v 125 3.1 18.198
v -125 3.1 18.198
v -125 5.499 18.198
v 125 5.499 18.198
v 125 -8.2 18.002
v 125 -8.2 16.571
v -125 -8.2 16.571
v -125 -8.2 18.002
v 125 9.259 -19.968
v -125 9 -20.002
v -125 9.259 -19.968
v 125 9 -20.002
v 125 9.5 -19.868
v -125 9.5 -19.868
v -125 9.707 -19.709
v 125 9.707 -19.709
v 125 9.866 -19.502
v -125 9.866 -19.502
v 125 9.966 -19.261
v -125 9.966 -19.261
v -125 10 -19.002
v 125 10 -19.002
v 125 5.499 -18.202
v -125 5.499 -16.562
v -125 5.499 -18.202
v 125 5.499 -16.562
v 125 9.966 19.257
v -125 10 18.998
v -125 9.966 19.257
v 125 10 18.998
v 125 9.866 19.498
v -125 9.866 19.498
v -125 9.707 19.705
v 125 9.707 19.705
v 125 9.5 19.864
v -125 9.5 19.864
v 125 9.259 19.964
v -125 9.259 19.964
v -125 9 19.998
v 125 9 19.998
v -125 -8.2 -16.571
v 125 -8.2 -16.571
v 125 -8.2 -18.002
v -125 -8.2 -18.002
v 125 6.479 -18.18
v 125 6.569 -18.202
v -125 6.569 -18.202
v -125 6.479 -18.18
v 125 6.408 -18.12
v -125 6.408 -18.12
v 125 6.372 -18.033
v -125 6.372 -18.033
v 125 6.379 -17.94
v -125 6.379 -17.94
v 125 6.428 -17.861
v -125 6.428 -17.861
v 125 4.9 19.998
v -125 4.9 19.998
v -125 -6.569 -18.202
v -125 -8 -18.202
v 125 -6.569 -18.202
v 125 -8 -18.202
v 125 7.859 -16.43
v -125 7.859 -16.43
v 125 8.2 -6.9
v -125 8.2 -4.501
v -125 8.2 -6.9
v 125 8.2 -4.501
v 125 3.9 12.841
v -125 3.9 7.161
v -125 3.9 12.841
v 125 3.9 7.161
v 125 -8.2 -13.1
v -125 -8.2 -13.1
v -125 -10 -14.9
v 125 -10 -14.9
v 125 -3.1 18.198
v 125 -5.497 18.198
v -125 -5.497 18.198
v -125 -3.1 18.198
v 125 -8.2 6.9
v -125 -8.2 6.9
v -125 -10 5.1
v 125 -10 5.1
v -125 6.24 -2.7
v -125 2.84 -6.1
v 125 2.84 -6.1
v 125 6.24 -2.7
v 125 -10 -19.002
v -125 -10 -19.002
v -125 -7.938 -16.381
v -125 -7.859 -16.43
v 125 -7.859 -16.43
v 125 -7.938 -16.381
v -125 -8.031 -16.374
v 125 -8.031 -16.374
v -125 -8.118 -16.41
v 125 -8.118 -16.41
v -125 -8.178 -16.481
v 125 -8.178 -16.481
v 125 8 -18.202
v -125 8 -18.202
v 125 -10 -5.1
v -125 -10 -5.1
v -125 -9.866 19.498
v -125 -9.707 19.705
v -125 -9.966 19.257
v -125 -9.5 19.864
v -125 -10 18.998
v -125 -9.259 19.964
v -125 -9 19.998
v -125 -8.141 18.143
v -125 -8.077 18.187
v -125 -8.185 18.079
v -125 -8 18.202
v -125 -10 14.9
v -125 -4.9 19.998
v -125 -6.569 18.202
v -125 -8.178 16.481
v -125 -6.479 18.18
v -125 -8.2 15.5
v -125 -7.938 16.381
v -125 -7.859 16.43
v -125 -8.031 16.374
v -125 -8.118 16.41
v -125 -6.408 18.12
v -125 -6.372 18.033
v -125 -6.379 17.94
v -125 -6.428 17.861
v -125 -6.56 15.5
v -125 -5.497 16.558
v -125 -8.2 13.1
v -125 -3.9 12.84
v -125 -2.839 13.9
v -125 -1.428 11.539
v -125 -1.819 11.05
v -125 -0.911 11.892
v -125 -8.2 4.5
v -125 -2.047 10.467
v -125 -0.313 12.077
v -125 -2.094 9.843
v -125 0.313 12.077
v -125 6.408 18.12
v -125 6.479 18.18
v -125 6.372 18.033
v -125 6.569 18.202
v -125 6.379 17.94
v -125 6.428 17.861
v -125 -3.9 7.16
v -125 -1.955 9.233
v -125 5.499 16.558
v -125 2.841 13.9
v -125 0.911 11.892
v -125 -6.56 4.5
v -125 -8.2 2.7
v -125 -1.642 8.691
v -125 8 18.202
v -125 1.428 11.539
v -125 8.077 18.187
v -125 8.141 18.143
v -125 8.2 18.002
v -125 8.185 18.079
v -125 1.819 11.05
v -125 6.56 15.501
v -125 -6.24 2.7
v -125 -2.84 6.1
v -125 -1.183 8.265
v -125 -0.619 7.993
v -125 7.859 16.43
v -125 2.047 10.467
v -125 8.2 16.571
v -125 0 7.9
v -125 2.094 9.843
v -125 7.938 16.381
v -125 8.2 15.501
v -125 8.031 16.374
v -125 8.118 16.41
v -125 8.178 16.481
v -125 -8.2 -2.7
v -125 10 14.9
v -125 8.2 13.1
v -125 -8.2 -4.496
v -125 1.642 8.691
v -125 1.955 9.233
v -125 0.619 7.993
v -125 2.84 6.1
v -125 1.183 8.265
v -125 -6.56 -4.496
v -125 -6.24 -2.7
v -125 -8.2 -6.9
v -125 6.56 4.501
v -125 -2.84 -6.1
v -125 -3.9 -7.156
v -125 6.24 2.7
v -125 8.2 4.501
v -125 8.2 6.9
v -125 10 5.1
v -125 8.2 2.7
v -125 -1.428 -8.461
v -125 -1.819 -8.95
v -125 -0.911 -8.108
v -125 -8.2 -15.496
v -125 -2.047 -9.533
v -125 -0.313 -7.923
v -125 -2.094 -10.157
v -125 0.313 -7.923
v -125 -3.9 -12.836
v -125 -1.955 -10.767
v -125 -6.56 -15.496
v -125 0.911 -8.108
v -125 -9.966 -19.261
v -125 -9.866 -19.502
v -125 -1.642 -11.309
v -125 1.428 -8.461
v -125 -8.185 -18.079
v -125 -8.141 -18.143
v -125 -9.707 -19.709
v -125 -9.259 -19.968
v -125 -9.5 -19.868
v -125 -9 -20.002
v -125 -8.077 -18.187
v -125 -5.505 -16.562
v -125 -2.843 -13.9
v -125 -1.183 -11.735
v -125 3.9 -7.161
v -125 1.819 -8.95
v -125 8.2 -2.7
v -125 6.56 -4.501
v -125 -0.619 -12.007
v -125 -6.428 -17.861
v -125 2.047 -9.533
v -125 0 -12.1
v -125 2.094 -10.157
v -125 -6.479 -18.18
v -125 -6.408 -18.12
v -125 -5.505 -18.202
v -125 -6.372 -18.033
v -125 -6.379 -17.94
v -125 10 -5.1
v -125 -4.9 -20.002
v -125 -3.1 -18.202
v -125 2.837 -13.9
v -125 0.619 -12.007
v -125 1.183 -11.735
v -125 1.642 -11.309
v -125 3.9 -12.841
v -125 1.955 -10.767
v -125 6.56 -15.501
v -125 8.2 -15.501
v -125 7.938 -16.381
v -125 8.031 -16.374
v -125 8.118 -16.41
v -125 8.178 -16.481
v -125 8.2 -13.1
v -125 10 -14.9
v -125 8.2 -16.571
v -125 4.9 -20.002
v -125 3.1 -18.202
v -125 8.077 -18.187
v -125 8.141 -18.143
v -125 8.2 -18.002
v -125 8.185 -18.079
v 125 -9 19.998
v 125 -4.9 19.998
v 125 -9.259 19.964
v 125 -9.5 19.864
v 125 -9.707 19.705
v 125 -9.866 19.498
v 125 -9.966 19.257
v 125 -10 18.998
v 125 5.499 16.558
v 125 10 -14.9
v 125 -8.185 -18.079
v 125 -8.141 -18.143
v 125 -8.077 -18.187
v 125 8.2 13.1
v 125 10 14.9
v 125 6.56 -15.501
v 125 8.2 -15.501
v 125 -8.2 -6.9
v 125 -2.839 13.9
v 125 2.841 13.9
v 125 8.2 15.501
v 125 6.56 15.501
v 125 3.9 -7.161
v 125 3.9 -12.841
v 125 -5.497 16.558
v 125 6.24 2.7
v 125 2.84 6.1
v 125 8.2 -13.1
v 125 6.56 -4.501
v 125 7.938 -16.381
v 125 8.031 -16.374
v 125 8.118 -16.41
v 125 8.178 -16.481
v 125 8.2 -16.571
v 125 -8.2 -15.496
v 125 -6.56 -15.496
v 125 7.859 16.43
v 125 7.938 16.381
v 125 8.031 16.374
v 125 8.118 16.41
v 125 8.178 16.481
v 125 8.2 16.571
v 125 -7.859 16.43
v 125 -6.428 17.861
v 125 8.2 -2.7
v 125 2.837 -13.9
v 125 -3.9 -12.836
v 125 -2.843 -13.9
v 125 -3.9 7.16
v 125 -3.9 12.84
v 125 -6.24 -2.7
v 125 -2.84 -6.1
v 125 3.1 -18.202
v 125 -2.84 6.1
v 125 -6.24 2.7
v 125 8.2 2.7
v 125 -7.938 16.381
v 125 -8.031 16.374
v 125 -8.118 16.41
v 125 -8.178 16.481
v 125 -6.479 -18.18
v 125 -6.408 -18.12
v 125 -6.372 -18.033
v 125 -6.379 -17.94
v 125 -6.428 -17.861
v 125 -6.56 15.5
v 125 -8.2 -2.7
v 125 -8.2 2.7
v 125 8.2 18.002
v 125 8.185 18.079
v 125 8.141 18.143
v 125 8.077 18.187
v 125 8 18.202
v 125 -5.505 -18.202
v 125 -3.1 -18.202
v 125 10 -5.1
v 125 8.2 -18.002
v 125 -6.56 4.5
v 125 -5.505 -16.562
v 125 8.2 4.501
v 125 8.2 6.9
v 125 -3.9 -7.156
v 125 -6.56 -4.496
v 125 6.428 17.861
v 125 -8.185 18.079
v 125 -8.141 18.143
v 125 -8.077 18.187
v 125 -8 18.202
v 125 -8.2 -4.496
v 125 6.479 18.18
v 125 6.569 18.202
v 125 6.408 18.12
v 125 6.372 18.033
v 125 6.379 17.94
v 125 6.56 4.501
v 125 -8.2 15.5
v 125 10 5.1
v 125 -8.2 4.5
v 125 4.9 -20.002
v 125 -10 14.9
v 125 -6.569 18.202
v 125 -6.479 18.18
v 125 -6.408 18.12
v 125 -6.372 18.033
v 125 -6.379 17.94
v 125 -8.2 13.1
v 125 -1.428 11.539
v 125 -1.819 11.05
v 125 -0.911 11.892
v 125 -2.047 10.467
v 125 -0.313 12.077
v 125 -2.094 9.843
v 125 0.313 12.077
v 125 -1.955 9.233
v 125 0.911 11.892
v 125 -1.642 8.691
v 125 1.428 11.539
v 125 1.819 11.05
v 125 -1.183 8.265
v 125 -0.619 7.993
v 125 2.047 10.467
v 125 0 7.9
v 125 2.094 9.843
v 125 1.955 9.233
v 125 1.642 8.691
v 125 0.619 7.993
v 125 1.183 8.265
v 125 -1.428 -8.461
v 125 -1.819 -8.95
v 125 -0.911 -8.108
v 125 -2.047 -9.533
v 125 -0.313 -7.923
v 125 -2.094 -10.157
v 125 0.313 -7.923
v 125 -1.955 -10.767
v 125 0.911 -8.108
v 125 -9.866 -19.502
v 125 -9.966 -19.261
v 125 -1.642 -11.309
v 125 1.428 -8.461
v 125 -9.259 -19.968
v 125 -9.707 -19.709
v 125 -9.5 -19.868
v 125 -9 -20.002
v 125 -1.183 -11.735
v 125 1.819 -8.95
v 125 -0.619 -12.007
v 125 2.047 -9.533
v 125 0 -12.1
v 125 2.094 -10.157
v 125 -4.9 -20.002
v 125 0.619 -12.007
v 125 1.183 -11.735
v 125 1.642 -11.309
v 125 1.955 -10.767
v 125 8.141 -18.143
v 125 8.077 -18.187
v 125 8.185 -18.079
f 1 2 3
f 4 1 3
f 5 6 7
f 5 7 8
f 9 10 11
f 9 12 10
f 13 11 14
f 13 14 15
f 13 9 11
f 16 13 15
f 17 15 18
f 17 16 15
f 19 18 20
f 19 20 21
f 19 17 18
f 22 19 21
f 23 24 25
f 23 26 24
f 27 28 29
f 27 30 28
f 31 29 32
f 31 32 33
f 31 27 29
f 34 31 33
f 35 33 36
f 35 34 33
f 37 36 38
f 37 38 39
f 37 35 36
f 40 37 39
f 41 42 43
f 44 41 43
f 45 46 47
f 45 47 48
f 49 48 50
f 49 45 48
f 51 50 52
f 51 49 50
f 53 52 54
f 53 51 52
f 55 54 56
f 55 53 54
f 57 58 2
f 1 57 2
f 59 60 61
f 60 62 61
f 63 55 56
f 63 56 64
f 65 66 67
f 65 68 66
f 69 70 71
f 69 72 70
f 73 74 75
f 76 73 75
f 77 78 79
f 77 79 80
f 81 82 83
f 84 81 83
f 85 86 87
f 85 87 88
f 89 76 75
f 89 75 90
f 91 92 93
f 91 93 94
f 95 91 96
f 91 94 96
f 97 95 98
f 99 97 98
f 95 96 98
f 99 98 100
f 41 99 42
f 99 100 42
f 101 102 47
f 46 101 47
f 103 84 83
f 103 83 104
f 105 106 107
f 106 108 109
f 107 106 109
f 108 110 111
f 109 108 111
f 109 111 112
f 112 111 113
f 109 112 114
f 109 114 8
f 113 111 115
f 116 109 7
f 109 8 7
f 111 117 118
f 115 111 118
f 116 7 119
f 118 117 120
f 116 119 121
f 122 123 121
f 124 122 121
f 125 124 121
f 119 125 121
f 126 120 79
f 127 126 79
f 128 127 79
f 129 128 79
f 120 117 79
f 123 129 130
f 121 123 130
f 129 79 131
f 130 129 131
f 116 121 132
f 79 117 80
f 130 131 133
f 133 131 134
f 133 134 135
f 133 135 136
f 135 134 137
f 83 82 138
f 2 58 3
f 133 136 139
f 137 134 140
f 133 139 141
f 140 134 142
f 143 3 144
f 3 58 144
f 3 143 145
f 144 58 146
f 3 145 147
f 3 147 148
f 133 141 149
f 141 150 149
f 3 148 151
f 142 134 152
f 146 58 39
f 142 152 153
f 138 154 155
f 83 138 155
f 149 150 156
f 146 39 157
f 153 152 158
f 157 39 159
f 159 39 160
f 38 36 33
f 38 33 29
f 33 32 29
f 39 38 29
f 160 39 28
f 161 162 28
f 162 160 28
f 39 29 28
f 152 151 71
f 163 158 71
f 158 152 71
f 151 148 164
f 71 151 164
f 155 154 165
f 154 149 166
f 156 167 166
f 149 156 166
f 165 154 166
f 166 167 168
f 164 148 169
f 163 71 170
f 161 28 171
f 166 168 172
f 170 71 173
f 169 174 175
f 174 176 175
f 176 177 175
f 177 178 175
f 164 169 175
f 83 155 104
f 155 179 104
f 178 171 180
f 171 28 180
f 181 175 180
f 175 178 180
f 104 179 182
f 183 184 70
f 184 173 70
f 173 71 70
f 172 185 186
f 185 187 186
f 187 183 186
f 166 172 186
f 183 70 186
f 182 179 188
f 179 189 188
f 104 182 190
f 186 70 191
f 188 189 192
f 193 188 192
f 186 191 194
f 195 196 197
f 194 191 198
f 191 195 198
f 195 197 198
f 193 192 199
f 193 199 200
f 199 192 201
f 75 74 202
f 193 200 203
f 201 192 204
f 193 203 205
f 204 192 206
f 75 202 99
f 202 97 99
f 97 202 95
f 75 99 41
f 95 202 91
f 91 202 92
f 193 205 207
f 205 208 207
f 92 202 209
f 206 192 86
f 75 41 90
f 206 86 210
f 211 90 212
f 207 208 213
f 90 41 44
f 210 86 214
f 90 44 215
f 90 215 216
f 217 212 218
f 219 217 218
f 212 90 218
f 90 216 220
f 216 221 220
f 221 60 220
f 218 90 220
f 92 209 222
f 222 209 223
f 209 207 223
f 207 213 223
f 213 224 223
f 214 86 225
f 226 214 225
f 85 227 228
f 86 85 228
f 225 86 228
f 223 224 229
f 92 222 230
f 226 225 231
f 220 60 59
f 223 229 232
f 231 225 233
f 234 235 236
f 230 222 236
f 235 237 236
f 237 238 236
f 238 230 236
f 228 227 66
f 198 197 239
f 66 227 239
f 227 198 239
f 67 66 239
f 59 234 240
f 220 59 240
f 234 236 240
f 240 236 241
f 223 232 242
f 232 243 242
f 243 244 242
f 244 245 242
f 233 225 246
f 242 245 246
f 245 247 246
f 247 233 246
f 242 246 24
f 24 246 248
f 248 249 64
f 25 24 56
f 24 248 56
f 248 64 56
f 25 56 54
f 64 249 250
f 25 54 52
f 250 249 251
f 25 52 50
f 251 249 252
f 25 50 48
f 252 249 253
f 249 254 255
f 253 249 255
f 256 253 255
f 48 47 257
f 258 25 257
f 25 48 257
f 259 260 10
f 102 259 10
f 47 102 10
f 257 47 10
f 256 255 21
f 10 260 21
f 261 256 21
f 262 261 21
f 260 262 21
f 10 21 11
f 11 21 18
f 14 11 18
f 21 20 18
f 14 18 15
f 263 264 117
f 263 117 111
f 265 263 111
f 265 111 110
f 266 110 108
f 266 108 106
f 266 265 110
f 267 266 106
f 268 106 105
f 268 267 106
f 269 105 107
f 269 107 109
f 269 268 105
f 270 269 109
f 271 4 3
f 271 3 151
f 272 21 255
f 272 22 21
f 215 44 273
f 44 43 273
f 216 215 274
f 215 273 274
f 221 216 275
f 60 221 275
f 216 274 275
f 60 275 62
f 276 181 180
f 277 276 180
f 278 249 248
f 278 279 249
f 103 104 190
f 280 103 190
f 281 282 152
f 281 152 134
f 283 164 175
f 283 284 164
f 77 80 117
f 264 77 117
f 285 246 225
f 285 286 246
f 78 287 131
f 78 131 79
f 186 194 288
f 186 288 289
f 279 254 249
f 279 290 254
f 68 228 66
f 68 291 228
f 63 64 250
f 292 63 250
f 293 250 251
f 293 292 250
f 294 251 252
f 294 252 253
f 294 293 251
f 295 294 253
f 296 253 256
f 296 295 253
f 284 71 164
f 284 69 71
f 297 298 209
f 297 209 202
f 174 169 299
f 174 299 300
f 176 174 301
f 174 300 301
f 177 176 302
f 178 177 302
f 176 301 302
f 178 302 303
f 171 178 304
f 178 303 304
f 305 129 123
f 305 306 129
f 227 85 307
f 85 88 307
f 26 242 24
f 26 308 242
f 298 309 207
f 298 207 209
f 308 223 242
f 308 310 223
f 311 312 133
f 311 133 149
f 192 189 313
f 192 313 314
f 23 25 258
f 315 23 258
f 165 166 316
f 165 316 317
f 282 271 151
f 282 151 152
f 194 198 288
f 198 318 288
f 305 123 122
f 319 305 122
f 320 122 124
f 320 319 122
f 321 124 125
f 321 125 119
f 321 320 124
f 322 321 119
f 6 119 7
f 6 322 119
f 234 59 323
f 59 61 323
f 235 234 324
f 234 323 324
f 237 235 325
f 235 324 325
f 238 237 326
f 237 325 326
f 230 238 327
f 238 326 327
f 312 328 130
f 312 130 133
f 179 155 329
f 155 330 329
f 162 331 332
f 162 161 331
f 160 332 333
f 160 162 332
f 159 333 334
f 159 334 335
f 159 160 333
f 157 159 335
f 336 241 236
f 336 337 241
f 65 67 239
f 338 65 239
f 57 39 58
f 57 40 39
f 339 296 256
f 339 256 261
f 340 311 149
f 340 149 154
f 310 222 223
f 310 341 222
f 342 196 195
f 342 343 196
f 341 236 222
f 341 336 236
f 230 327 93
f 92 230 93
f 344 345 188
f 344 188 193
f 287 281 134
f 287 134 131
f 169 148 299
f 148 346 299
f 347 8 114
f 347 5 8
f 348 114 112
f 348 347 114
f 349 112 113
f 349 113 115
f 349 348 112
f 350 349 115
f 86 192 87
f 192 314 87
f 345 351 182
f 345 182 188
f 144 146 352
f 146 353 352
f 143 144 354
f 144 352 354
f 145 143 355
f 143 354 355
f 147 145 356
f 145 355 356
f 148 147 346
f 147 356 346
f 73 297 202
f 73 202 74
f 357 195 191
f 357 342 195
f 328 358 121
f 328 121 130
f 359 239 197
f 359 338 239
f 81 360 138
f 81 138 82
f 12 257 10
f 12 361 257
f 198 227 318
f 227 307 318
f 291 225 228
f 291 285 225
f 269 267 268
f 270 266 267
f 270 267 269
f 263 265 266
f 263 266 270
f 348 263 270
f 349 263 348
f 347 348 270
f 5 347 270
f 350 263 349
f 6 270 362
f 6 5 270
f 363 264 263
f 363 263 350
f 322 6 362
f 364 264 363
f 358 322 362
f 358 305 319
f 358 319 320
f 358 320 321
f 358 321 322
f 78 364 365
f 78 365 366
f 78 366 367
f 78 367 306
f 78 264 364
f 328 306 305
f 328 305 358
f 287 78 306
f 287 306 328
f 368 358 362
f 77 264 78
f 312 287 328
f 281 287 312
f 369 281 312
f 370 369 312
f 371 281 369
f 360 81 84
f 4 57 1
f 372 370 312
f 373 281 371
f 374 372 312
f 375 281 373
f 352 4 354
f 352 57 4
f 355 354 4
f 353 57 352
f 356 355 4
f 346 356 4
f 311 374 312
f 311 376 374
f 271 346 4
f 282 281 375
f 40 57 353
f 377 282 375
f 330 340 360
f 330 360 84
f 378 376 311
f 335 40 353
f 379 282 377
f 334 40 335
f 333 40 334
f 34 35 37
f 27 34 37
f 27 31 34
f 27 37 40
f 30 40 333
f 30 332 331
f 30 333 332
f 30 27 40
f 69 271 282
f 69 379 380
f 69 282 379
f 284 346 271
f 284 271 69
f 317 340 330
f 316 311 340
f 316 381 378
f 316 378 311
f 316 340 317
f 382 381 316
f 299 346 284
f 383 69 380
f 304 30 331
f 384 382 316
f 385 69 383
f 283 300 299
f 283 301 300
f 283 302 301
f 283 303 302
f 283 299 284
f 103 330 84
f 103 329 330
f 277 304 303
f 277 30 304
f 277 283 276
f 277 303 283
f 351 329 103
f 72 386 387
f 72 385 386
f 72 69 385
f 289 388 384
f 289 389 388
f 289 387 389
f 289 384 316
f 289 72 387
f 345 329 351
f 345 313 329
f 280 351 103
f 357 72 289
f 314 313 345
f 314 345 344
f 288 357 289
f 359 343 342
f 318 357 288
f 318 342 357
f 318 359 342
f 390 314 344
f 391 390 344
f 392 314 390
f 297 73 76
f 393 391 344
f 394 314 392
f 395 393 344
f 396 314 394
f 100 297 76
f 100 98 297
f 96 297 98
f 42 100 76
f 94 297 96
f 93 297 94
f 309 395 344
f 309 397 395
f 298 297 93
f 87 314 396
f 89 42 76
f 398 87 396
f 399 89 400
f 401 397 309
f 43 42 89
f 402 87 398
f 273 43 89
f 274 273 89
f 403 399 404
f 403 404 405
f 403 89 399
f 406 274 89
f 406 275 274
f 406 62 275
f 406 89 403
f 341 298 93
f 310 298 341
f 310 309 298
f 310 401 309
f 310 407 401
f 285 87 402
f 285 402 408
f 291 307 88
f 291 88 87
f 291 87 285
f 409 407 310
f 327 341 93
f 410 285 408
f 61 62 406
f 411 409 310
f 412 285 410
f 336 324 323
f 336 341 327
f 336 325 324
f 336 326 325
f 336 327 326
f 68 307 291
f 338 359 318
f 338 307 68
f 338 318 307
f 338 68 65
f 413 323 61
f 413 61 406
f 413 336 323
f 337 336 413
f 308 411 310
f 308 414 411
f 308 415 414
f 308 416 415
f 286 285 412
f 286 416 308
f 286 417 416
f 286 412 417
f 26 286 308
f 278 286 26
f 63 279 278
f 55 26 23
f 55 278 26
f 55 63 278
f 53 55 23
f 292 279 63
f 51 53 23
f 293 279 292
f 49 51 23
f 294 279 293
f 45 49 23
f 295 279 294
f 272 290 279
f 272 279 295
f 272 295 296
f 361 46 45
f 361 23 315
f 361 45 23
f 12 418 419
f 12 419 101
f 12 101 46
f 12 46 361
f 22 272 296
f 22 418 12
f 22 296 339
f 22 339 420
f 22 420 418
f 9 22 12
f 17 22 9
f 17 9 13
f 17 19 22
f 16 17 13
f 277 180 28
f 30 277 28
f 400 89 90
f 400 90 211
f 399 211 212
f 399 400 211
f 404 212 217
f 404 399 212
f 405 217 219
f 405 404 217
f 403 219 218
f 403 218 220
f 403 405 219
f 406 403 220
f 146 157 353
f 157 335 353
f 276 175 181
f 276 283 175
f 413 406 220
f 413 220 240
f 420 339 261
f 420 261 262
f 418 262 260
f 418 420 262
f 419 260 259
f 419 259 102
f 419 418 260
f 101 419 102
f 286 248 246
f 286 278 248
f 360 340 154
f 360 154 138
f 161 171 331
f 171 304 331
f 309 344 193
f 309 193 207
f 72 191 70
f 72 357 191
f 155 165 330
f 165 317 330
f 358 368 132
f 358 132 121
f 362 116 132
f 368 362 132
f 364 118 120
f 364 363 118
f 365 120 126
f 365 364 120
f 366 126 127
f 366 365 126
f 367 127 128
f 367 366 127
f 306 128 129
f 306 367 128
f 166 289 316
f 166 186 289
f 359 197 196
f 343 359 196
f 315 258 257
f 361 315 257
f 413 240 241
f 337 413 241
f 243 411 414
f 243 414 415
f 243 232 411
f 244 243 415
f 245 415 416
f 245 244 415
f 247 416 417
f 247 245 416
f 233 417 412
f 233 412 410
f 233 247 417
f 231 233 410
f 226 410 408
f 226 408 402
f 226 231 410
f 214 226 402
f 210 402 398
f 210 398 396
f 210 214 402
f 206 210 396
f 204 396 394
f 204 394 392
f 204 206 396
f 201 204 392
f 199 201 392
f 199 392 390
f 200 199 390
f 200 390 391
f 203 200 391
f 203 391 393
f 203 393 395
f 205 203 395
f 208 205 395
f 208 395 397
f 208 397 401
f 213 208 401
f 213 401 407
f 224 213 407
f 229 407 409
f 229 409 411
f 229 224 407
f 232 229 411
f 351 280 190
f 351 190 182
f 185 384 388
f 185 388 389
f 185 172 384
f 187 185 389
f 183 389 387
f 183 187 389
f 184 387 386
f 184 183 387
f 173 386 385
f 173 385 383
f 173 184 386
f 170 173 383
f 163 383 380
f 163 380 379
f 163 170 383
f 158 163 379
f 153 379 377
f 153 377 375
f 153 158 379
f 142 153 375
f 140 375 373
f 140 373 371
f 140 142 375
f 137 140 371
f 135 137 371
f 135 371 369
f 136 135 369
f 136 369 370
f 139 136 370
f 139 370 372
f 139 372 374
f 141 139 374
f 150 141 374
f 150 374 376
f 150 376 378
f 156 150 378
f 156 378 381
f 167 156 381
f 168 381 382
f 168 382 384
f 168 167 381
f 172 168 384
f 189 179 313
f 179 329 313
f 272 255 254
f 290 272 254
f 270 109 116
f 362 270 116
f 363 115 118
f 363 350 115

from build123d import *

# Parameters (mm, degrees)
SKETCH5_R           = 2.1
BOSS_EXTRUDE1_DEPTH = 125


with BuildPart() as part:
    # Sketch5 → Boss-Extrude1 (new body, symmetric)
    with BuildSketch(Plane(origin=(0, 0, 0), x_dir=(0, 0, -1), z_dir=(1, 0, 0))):
        with BuildLine():
            Line((-19.998019485, 4.9), (-18.198019485, 3.1))
            Line((-18.198019485, 3.1), (-18.198019485, 5.499339828))
            Line((-18.198019485, 5.499339828), (-16.558019485, 5.499339828))
            Line((-16.558019485, 5.499339828), (-13.9, 2.841320344))
            Line((-13.9, 2.841320344), (-13.9, -2.838679656))
            Line((-13.9, -2.838679656), (-16.558019485, -5.496699141))
            Line((-16.558019485, -5.496699141), (-18.198019485, -5.496699141))
            Line((-18.198019485, -5.496699141), (-18.198019485, -3.1))
            Line((-18.198019485, -3.1), (-19.998019485, -4.9))
            Line((-19.998019485, -4.9), (-19.998019485, -9))
            ThreePointArc((-19.998019485, -9), (-19.705126266, -9.707106781), (-18.998019485, -10))
            Line((-18.998019485, -10), (-14.9, -10))
            Line((-14.9, -10), (-13.1, -8.2))
            Line((-13.1, -8.2), (-15.5, -8.2))
            Line((-15.5, -8.2), (-15.5, -6.56))
            Line((-15.5, -6.56), (-12.84, -3.9))
            Line((-12.84, -3.9), (-7.16, -3.9))
            Line((-7.16, -3.9), (-4.5, -6.56))
            Line((-4.5, -6.56), (-4.5, -8.2))
            Line((-4.5, -8.2), (-6.9, -8.2))
            Line((-6.9, -8.2), (-5.1, -10))
            Line((-5.1, -10), (5.1, -10))
            Line((5.1, -10), (6.9, -8.2))
            Line((6.9, -8.2), (4.496038969, -8.2))
            Line((4.496038969, -8.2), (4.496038969, -6.56))
            Line((4.496038969, -6.56), (7.156038969, -3.9))
            Line((7.156038969, -3.9), (12.836038969, -3.9))
            Line((12.836038969, -3.9), (15.496038969, -6.56))
            Line((15.496038969, -6.56), (15.496038969, -8.2))
            Line((15.496038969, -8.2), (13.1, -8.2))
            Line((13.1, -8.2), (14.9, -10))
            Line((14.9, -10), (19.001980515, -10))
            ThreePointArc((19.001980515, -10), (19.709087297, -9.707106781), (20.001980515, -9))
            Line((20.001980515, -9), (20.001980515, -4.9))
            Line((20.001980515, -4.9), (18.201980515, -3.1))
            Line((18.201980515, -3.1), (18.201980515, -5.504621202))
            Line((18.201980515, -5.504621202), (16.561980515, -5.504621202))
            Line((16.561980515, -5.504621202), (13.9, -2.842640687))
            Line((13.9, -2.842640687), (13.9, 2.837359313))
            Line((13.9, 2.837359313), (16.561980515, 5.499339828))
            Line((16.561980515, 5.499339828), (18.201980515, 5.499339828))
            Line((18.201980515, 5.499339828), (18.201980515, 3.1))
            Line((18.201980515, 3.1), (20.001980515, 4.9))
            Line((20.001980515, 4.9), (20.001980515, 9))
            ThreePointArc((20.001980515, 9), (19.709087297, 9.707106781), (19.001980515, 10))
            Line((19.001980515, 10), (14.9, 10))
            Line((14.9, 10), (13.1, 8.2))
            Line((13.1, 8.2), (15.501320344, 8.2))
            Line((15.501320344, 8.2), (15.501320344, 6.56))
            Line((15.501320344, 6.56), (12.841320344, 3.9))
            Line((12.841320344, 3.9), (7.161320344, 3.9))
            Line((7.161320344, 3.9), (4.501320344, 6.56))
            Line((4.501320344, 6.56), (4.501320344, 8.2))
            Line((4.501320344, 8.2), (6.9, 8.2))
            Line((6.9, 8.2), (5.1, 10))
            Line((5.1, 10), (-5.1, 10))
            Line((-5.1, 10), (-6.9, 8.2))
            Line((-6.9, 8.2), (-4.501320344, 8.2))
            Line((-4.501320344, 8.2), (-4.501320344, 6.56))
            Line((-4.501320344, 6.56), (-7.161320344, 3.9))
            Line((-7.161320344, 3.9), (-12.841320344, 3.9))
            Line((-12.841320344, 3.9), (-15.501320344, 6.56))
            Line((-15.501320344, 6.56), (-15.501320344, 8.2))
            Line((-15.501320344, 8.2), (-13.1, 8.2))
            Line((-13.1, 8.2), (-14.9, 10))
            Line((-14.9, 10), (-18.998019485, 10))
            ThreePointArc((-18.998019485, 10), (-19.705126266, 9.707106781), (-19.998019485, 9))
            Line((-19.998019485, 9), (-19.998019485, 4.9))
        make_face()
        with Locations((-10, 0)):
            Circle(SKETCH5_R, mode=Mode.SUBTRACT)
        with Locations((10, 0)):
            Circle(SKETCH5_R, mode=Mode.SUBTRACT)
        Polygon((6.1, -2.84), (6.1, 2.84), (2.7, 6.24), (2.7, 8.2), (-2.7, 8.2), (-2.7, 6.24), (-6.1, 2.84), (-6.1, -2.84), (-2.7, -6.24), (-2.7, -8.2), (2.7, -8.2), (2.7, -6.24), align=None, mode=Mode.SUBTRACT)
        with BuildLine():
            Line((16.571320344, 8.2), (18.001980515, 8.2))
            ThreePointArc((18.001980515, 8.2), (18.143401872, 8.141421356), (18.201980515, 8))
            Line((18.201980515, 8), (18.201980515, 6.569339828))
            ThreePointArc((18.201980515, 6.569339828), (18.078517202, 6.384563922), (17.860559159, 6.427918472))
            Line((17.860559159, 6.427918472), (16.429898987, 7.858578644))
            ThreePointArc((16.429898987, 7.858578644), (16.386544437, 8.076536686), (16.571320344, 8.2))
        make_face(mode=Mode.SUBTRACT)
        with BuildLine():
            Line((16.571320344, -8.2), (18.001980515, -8.2))
            ThreePointArc((18.001980515, -8.2), (18.143401872, -8.141421356), (18.201980515, -8))
            Line((18.201980515, -8), (18.201980515, -6.569339828))
            ThreePointArc((18.201980515, -6.569339828), (18.078517202, -6.384563922), (17.860559159, -6.427918472))
            Line((17.860559159, -6.427918472), (16.429898987, -7.858578644))
            ThreePointArc((16.429898987, -7.858578644), (16.386544437, -8.076536686), (16.571320344, -8.2))
        make_face(mode=Mode.SUBTRACT)
        with BuildLine():
            Line((-17.860559159, 6.427918472), (-16.429898987, 7.858578644))
            ThreePointArc((-16.429898987, 7.858578644), (-16.386544437, 8.076536686), (-16.571320344, 8.2))
            Line((-16.571320344, 8.2), (-18.001980515, 8.2))
            ThreePointArc((-18.001980515, 8.2), (-18.143401872, 8.141421356), (-18.201980515, 8))
            Line((-18.201980515, 8), (-18.201980515, 6.569339828))
            ThreePointArc((-18.201980515, 6.569339828), (-18.078517202, 6.384563922), (-17.860559159, 6.427918472))
        make_face(mode=Mode.SUBTRACT)
        with BuildLine():
            Line((-16.571320344, -8.2), (-18.001980515, -8.2))
            ThreePointArc((-18.001980515, -8.2), (-18.143401872, -8.141421356), (-18.201980515, -8))
            Line((-18.201980515, -8), (-18.201980515, -6.569339828))
            ThreePointArc((-18.201980515, -6.569339828), (-18.078517202, -6.384563922), (-17.860559159, -6.427918472))
            Line((-17.860559159, -6.427918472), (-16.429898987, -7.858578644))
            ThreePointArc((-16.429898987, -7.858578644), (-16.386544437, -8.076536686), (-16.571320344, -8.2))
        make_face(mode=Mode.SUBTRACT)
    extrude(amount=BOSS_EXTRUDE1_DEPTH, both=True)


solid = part.part
